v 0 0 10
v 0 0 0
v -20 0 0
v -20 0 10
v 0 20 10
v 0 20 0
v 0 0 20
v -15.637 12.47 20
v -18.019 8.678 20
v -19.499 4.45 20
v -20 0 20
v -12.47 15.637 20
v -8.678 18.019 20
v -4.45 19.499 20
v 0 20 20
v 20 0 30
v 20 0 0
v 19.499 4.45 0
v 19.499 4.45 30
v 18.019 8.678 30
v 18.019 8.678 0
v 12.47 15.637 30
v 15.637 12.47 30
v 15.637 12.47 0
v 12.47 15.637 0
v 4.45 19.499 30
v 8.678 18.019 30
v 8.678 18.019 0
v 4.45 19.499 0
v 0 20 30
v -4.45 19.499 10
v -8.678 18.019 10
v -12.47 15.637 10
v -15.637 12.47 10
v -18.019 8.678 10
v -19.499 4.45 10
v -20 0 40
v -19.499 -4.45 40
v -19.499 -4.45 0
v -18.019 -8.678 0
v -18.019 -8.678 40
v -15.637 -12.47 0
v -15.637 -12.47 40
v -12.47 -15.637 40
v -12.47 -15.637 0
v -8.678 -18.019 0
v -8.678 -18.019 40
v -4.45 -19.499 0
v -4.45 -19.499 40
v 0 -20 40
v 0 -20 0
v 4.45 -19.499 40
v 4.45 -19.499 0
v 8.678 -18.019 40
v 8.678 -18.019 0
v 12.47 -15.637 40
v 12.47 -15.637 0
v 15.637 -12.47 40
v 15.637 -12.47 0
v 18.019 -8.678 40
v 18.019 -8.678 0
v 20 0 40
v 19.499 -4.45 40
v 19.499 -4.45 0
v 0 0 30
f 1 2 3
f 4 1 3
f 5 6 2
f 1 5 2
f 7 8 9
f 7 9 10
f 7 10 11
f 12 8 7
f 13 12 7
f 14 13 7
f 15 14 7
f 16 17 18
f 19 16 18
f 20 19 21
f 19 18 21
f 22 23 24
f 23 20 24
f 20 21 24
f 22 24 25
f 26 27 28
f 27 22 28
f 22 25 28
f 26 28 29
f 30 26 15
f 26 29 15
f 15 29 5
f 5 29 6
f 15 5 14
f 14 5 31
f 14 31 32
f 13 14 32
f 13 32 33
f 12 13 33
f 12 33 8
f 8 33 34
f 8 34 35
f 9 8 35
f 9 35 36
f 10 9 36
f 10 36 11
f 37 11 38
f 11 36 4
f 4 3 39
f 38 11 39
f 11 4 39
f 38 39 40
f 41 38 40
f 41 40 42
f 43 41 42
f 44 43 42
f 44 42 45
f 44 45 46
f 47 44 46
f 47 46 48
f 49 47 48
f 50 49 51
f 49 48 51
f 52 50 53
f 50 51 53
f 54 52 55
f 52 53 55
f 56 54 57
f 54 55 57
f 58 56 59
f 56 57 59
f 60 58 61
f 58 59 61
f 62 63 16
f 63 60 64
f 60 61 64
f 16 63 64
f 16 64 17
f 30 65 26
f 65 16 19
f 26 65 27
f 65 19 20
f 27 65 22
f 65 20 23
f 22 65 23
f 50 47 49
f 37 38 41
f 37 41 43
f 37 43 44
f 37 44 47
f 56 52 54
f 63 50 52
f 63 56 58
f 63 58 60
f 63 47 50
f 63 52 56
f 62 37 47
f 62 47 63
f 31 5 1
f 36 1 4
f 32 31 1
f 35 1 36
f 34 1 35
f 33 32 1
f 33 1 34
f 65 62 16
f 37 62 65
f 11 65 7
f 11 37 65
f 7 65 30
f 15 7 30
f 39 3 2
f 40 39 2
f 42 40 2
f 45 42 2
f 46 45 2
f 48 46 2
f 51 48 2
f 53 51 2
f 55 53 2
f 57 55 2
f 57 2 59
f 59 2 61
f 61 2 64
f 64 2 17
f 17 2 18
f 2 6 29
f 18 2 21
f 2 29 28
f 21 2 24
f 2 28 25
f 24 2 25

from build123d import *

# Parameters (mm, degrees)
SKETCH2_R               = 20
BOSS_EXTRUDE1_DEPTH     = 40
CUT_EXTRUDE1_DEPTH      = 40
CUT_EXTRUDE1_DEPTH_BACK = 40
SKETCH3_W               = 10
SKETCH3_H               = 20
CUT_EXTRUDE2_START      = -10
CUT_EXTRUDE2_DEPTH      = 10
CUT_EXTRUDE3_DEPTH      = 10


with BuildPart() as part:
    # Sketch2 → Boss-Extrude1 (new body)
    with BuildSketch(Plane.XY):
        Circle(SKETCH2_R)
    extrude(amount=BOSS_EXTRUDE1_DEPTH)

    # Sketch3 → Cut-Extrude1 (cut, two sides: drawn at the far end of the back side and taken through both)
    with BuildSketch(Plane(origin=(0, 0, 0), x_dir=(0, 0, -1), z_dir=(1, 0, 0)).offset(-CUT_EXTRUDE1_DEPTH_BACK)):
        with Locations((-35, 10)):
            Rectangle(SKETCH3_W, SKETCH3_H)
    extrude(amount=CUT_EXTRUDE1_DEPTH + CUT_EXTRUDE1_DEPTH_BACK, mode=Mode.SUBTRACT)

    # Sketch4 → Cut-Extrude2 (cut)
    with BuildSketch(Plane.XY.offset(30).offset(CUT_EXTRUDE2_START)):
        with BuildLine():
            Line((-20, 0), (0, 0))
            Line((0, 0), (0, 20))
            ThreePointArc((0, 20), (-14.142135624, 14.142135624), (-20, 0))
        make_face()
    extrude(amount=CUT_EXTRUDE2_DEPTH, mode=Mode.SUBTRACT)

    # Sketch5 → Cut-Extrude3 (cut)
    with BuildSketch(Plane(origin=(0, 0, 0), x_dir=(-1, 0, 0), z_dir=(0, 0, -1))):
        with BuildLine():
            Line((0, 20), (0, 0))
            Line((0, 0), (20, 0))
            ThreePointArc((20, 0), (14.142135624, 14.142135624), (0, 20))
        make_face()
    extrude(amount=-CUT_EXTRUDE3_DEPTH, mode=Mode.SUBTRACT)


solid = part.part
